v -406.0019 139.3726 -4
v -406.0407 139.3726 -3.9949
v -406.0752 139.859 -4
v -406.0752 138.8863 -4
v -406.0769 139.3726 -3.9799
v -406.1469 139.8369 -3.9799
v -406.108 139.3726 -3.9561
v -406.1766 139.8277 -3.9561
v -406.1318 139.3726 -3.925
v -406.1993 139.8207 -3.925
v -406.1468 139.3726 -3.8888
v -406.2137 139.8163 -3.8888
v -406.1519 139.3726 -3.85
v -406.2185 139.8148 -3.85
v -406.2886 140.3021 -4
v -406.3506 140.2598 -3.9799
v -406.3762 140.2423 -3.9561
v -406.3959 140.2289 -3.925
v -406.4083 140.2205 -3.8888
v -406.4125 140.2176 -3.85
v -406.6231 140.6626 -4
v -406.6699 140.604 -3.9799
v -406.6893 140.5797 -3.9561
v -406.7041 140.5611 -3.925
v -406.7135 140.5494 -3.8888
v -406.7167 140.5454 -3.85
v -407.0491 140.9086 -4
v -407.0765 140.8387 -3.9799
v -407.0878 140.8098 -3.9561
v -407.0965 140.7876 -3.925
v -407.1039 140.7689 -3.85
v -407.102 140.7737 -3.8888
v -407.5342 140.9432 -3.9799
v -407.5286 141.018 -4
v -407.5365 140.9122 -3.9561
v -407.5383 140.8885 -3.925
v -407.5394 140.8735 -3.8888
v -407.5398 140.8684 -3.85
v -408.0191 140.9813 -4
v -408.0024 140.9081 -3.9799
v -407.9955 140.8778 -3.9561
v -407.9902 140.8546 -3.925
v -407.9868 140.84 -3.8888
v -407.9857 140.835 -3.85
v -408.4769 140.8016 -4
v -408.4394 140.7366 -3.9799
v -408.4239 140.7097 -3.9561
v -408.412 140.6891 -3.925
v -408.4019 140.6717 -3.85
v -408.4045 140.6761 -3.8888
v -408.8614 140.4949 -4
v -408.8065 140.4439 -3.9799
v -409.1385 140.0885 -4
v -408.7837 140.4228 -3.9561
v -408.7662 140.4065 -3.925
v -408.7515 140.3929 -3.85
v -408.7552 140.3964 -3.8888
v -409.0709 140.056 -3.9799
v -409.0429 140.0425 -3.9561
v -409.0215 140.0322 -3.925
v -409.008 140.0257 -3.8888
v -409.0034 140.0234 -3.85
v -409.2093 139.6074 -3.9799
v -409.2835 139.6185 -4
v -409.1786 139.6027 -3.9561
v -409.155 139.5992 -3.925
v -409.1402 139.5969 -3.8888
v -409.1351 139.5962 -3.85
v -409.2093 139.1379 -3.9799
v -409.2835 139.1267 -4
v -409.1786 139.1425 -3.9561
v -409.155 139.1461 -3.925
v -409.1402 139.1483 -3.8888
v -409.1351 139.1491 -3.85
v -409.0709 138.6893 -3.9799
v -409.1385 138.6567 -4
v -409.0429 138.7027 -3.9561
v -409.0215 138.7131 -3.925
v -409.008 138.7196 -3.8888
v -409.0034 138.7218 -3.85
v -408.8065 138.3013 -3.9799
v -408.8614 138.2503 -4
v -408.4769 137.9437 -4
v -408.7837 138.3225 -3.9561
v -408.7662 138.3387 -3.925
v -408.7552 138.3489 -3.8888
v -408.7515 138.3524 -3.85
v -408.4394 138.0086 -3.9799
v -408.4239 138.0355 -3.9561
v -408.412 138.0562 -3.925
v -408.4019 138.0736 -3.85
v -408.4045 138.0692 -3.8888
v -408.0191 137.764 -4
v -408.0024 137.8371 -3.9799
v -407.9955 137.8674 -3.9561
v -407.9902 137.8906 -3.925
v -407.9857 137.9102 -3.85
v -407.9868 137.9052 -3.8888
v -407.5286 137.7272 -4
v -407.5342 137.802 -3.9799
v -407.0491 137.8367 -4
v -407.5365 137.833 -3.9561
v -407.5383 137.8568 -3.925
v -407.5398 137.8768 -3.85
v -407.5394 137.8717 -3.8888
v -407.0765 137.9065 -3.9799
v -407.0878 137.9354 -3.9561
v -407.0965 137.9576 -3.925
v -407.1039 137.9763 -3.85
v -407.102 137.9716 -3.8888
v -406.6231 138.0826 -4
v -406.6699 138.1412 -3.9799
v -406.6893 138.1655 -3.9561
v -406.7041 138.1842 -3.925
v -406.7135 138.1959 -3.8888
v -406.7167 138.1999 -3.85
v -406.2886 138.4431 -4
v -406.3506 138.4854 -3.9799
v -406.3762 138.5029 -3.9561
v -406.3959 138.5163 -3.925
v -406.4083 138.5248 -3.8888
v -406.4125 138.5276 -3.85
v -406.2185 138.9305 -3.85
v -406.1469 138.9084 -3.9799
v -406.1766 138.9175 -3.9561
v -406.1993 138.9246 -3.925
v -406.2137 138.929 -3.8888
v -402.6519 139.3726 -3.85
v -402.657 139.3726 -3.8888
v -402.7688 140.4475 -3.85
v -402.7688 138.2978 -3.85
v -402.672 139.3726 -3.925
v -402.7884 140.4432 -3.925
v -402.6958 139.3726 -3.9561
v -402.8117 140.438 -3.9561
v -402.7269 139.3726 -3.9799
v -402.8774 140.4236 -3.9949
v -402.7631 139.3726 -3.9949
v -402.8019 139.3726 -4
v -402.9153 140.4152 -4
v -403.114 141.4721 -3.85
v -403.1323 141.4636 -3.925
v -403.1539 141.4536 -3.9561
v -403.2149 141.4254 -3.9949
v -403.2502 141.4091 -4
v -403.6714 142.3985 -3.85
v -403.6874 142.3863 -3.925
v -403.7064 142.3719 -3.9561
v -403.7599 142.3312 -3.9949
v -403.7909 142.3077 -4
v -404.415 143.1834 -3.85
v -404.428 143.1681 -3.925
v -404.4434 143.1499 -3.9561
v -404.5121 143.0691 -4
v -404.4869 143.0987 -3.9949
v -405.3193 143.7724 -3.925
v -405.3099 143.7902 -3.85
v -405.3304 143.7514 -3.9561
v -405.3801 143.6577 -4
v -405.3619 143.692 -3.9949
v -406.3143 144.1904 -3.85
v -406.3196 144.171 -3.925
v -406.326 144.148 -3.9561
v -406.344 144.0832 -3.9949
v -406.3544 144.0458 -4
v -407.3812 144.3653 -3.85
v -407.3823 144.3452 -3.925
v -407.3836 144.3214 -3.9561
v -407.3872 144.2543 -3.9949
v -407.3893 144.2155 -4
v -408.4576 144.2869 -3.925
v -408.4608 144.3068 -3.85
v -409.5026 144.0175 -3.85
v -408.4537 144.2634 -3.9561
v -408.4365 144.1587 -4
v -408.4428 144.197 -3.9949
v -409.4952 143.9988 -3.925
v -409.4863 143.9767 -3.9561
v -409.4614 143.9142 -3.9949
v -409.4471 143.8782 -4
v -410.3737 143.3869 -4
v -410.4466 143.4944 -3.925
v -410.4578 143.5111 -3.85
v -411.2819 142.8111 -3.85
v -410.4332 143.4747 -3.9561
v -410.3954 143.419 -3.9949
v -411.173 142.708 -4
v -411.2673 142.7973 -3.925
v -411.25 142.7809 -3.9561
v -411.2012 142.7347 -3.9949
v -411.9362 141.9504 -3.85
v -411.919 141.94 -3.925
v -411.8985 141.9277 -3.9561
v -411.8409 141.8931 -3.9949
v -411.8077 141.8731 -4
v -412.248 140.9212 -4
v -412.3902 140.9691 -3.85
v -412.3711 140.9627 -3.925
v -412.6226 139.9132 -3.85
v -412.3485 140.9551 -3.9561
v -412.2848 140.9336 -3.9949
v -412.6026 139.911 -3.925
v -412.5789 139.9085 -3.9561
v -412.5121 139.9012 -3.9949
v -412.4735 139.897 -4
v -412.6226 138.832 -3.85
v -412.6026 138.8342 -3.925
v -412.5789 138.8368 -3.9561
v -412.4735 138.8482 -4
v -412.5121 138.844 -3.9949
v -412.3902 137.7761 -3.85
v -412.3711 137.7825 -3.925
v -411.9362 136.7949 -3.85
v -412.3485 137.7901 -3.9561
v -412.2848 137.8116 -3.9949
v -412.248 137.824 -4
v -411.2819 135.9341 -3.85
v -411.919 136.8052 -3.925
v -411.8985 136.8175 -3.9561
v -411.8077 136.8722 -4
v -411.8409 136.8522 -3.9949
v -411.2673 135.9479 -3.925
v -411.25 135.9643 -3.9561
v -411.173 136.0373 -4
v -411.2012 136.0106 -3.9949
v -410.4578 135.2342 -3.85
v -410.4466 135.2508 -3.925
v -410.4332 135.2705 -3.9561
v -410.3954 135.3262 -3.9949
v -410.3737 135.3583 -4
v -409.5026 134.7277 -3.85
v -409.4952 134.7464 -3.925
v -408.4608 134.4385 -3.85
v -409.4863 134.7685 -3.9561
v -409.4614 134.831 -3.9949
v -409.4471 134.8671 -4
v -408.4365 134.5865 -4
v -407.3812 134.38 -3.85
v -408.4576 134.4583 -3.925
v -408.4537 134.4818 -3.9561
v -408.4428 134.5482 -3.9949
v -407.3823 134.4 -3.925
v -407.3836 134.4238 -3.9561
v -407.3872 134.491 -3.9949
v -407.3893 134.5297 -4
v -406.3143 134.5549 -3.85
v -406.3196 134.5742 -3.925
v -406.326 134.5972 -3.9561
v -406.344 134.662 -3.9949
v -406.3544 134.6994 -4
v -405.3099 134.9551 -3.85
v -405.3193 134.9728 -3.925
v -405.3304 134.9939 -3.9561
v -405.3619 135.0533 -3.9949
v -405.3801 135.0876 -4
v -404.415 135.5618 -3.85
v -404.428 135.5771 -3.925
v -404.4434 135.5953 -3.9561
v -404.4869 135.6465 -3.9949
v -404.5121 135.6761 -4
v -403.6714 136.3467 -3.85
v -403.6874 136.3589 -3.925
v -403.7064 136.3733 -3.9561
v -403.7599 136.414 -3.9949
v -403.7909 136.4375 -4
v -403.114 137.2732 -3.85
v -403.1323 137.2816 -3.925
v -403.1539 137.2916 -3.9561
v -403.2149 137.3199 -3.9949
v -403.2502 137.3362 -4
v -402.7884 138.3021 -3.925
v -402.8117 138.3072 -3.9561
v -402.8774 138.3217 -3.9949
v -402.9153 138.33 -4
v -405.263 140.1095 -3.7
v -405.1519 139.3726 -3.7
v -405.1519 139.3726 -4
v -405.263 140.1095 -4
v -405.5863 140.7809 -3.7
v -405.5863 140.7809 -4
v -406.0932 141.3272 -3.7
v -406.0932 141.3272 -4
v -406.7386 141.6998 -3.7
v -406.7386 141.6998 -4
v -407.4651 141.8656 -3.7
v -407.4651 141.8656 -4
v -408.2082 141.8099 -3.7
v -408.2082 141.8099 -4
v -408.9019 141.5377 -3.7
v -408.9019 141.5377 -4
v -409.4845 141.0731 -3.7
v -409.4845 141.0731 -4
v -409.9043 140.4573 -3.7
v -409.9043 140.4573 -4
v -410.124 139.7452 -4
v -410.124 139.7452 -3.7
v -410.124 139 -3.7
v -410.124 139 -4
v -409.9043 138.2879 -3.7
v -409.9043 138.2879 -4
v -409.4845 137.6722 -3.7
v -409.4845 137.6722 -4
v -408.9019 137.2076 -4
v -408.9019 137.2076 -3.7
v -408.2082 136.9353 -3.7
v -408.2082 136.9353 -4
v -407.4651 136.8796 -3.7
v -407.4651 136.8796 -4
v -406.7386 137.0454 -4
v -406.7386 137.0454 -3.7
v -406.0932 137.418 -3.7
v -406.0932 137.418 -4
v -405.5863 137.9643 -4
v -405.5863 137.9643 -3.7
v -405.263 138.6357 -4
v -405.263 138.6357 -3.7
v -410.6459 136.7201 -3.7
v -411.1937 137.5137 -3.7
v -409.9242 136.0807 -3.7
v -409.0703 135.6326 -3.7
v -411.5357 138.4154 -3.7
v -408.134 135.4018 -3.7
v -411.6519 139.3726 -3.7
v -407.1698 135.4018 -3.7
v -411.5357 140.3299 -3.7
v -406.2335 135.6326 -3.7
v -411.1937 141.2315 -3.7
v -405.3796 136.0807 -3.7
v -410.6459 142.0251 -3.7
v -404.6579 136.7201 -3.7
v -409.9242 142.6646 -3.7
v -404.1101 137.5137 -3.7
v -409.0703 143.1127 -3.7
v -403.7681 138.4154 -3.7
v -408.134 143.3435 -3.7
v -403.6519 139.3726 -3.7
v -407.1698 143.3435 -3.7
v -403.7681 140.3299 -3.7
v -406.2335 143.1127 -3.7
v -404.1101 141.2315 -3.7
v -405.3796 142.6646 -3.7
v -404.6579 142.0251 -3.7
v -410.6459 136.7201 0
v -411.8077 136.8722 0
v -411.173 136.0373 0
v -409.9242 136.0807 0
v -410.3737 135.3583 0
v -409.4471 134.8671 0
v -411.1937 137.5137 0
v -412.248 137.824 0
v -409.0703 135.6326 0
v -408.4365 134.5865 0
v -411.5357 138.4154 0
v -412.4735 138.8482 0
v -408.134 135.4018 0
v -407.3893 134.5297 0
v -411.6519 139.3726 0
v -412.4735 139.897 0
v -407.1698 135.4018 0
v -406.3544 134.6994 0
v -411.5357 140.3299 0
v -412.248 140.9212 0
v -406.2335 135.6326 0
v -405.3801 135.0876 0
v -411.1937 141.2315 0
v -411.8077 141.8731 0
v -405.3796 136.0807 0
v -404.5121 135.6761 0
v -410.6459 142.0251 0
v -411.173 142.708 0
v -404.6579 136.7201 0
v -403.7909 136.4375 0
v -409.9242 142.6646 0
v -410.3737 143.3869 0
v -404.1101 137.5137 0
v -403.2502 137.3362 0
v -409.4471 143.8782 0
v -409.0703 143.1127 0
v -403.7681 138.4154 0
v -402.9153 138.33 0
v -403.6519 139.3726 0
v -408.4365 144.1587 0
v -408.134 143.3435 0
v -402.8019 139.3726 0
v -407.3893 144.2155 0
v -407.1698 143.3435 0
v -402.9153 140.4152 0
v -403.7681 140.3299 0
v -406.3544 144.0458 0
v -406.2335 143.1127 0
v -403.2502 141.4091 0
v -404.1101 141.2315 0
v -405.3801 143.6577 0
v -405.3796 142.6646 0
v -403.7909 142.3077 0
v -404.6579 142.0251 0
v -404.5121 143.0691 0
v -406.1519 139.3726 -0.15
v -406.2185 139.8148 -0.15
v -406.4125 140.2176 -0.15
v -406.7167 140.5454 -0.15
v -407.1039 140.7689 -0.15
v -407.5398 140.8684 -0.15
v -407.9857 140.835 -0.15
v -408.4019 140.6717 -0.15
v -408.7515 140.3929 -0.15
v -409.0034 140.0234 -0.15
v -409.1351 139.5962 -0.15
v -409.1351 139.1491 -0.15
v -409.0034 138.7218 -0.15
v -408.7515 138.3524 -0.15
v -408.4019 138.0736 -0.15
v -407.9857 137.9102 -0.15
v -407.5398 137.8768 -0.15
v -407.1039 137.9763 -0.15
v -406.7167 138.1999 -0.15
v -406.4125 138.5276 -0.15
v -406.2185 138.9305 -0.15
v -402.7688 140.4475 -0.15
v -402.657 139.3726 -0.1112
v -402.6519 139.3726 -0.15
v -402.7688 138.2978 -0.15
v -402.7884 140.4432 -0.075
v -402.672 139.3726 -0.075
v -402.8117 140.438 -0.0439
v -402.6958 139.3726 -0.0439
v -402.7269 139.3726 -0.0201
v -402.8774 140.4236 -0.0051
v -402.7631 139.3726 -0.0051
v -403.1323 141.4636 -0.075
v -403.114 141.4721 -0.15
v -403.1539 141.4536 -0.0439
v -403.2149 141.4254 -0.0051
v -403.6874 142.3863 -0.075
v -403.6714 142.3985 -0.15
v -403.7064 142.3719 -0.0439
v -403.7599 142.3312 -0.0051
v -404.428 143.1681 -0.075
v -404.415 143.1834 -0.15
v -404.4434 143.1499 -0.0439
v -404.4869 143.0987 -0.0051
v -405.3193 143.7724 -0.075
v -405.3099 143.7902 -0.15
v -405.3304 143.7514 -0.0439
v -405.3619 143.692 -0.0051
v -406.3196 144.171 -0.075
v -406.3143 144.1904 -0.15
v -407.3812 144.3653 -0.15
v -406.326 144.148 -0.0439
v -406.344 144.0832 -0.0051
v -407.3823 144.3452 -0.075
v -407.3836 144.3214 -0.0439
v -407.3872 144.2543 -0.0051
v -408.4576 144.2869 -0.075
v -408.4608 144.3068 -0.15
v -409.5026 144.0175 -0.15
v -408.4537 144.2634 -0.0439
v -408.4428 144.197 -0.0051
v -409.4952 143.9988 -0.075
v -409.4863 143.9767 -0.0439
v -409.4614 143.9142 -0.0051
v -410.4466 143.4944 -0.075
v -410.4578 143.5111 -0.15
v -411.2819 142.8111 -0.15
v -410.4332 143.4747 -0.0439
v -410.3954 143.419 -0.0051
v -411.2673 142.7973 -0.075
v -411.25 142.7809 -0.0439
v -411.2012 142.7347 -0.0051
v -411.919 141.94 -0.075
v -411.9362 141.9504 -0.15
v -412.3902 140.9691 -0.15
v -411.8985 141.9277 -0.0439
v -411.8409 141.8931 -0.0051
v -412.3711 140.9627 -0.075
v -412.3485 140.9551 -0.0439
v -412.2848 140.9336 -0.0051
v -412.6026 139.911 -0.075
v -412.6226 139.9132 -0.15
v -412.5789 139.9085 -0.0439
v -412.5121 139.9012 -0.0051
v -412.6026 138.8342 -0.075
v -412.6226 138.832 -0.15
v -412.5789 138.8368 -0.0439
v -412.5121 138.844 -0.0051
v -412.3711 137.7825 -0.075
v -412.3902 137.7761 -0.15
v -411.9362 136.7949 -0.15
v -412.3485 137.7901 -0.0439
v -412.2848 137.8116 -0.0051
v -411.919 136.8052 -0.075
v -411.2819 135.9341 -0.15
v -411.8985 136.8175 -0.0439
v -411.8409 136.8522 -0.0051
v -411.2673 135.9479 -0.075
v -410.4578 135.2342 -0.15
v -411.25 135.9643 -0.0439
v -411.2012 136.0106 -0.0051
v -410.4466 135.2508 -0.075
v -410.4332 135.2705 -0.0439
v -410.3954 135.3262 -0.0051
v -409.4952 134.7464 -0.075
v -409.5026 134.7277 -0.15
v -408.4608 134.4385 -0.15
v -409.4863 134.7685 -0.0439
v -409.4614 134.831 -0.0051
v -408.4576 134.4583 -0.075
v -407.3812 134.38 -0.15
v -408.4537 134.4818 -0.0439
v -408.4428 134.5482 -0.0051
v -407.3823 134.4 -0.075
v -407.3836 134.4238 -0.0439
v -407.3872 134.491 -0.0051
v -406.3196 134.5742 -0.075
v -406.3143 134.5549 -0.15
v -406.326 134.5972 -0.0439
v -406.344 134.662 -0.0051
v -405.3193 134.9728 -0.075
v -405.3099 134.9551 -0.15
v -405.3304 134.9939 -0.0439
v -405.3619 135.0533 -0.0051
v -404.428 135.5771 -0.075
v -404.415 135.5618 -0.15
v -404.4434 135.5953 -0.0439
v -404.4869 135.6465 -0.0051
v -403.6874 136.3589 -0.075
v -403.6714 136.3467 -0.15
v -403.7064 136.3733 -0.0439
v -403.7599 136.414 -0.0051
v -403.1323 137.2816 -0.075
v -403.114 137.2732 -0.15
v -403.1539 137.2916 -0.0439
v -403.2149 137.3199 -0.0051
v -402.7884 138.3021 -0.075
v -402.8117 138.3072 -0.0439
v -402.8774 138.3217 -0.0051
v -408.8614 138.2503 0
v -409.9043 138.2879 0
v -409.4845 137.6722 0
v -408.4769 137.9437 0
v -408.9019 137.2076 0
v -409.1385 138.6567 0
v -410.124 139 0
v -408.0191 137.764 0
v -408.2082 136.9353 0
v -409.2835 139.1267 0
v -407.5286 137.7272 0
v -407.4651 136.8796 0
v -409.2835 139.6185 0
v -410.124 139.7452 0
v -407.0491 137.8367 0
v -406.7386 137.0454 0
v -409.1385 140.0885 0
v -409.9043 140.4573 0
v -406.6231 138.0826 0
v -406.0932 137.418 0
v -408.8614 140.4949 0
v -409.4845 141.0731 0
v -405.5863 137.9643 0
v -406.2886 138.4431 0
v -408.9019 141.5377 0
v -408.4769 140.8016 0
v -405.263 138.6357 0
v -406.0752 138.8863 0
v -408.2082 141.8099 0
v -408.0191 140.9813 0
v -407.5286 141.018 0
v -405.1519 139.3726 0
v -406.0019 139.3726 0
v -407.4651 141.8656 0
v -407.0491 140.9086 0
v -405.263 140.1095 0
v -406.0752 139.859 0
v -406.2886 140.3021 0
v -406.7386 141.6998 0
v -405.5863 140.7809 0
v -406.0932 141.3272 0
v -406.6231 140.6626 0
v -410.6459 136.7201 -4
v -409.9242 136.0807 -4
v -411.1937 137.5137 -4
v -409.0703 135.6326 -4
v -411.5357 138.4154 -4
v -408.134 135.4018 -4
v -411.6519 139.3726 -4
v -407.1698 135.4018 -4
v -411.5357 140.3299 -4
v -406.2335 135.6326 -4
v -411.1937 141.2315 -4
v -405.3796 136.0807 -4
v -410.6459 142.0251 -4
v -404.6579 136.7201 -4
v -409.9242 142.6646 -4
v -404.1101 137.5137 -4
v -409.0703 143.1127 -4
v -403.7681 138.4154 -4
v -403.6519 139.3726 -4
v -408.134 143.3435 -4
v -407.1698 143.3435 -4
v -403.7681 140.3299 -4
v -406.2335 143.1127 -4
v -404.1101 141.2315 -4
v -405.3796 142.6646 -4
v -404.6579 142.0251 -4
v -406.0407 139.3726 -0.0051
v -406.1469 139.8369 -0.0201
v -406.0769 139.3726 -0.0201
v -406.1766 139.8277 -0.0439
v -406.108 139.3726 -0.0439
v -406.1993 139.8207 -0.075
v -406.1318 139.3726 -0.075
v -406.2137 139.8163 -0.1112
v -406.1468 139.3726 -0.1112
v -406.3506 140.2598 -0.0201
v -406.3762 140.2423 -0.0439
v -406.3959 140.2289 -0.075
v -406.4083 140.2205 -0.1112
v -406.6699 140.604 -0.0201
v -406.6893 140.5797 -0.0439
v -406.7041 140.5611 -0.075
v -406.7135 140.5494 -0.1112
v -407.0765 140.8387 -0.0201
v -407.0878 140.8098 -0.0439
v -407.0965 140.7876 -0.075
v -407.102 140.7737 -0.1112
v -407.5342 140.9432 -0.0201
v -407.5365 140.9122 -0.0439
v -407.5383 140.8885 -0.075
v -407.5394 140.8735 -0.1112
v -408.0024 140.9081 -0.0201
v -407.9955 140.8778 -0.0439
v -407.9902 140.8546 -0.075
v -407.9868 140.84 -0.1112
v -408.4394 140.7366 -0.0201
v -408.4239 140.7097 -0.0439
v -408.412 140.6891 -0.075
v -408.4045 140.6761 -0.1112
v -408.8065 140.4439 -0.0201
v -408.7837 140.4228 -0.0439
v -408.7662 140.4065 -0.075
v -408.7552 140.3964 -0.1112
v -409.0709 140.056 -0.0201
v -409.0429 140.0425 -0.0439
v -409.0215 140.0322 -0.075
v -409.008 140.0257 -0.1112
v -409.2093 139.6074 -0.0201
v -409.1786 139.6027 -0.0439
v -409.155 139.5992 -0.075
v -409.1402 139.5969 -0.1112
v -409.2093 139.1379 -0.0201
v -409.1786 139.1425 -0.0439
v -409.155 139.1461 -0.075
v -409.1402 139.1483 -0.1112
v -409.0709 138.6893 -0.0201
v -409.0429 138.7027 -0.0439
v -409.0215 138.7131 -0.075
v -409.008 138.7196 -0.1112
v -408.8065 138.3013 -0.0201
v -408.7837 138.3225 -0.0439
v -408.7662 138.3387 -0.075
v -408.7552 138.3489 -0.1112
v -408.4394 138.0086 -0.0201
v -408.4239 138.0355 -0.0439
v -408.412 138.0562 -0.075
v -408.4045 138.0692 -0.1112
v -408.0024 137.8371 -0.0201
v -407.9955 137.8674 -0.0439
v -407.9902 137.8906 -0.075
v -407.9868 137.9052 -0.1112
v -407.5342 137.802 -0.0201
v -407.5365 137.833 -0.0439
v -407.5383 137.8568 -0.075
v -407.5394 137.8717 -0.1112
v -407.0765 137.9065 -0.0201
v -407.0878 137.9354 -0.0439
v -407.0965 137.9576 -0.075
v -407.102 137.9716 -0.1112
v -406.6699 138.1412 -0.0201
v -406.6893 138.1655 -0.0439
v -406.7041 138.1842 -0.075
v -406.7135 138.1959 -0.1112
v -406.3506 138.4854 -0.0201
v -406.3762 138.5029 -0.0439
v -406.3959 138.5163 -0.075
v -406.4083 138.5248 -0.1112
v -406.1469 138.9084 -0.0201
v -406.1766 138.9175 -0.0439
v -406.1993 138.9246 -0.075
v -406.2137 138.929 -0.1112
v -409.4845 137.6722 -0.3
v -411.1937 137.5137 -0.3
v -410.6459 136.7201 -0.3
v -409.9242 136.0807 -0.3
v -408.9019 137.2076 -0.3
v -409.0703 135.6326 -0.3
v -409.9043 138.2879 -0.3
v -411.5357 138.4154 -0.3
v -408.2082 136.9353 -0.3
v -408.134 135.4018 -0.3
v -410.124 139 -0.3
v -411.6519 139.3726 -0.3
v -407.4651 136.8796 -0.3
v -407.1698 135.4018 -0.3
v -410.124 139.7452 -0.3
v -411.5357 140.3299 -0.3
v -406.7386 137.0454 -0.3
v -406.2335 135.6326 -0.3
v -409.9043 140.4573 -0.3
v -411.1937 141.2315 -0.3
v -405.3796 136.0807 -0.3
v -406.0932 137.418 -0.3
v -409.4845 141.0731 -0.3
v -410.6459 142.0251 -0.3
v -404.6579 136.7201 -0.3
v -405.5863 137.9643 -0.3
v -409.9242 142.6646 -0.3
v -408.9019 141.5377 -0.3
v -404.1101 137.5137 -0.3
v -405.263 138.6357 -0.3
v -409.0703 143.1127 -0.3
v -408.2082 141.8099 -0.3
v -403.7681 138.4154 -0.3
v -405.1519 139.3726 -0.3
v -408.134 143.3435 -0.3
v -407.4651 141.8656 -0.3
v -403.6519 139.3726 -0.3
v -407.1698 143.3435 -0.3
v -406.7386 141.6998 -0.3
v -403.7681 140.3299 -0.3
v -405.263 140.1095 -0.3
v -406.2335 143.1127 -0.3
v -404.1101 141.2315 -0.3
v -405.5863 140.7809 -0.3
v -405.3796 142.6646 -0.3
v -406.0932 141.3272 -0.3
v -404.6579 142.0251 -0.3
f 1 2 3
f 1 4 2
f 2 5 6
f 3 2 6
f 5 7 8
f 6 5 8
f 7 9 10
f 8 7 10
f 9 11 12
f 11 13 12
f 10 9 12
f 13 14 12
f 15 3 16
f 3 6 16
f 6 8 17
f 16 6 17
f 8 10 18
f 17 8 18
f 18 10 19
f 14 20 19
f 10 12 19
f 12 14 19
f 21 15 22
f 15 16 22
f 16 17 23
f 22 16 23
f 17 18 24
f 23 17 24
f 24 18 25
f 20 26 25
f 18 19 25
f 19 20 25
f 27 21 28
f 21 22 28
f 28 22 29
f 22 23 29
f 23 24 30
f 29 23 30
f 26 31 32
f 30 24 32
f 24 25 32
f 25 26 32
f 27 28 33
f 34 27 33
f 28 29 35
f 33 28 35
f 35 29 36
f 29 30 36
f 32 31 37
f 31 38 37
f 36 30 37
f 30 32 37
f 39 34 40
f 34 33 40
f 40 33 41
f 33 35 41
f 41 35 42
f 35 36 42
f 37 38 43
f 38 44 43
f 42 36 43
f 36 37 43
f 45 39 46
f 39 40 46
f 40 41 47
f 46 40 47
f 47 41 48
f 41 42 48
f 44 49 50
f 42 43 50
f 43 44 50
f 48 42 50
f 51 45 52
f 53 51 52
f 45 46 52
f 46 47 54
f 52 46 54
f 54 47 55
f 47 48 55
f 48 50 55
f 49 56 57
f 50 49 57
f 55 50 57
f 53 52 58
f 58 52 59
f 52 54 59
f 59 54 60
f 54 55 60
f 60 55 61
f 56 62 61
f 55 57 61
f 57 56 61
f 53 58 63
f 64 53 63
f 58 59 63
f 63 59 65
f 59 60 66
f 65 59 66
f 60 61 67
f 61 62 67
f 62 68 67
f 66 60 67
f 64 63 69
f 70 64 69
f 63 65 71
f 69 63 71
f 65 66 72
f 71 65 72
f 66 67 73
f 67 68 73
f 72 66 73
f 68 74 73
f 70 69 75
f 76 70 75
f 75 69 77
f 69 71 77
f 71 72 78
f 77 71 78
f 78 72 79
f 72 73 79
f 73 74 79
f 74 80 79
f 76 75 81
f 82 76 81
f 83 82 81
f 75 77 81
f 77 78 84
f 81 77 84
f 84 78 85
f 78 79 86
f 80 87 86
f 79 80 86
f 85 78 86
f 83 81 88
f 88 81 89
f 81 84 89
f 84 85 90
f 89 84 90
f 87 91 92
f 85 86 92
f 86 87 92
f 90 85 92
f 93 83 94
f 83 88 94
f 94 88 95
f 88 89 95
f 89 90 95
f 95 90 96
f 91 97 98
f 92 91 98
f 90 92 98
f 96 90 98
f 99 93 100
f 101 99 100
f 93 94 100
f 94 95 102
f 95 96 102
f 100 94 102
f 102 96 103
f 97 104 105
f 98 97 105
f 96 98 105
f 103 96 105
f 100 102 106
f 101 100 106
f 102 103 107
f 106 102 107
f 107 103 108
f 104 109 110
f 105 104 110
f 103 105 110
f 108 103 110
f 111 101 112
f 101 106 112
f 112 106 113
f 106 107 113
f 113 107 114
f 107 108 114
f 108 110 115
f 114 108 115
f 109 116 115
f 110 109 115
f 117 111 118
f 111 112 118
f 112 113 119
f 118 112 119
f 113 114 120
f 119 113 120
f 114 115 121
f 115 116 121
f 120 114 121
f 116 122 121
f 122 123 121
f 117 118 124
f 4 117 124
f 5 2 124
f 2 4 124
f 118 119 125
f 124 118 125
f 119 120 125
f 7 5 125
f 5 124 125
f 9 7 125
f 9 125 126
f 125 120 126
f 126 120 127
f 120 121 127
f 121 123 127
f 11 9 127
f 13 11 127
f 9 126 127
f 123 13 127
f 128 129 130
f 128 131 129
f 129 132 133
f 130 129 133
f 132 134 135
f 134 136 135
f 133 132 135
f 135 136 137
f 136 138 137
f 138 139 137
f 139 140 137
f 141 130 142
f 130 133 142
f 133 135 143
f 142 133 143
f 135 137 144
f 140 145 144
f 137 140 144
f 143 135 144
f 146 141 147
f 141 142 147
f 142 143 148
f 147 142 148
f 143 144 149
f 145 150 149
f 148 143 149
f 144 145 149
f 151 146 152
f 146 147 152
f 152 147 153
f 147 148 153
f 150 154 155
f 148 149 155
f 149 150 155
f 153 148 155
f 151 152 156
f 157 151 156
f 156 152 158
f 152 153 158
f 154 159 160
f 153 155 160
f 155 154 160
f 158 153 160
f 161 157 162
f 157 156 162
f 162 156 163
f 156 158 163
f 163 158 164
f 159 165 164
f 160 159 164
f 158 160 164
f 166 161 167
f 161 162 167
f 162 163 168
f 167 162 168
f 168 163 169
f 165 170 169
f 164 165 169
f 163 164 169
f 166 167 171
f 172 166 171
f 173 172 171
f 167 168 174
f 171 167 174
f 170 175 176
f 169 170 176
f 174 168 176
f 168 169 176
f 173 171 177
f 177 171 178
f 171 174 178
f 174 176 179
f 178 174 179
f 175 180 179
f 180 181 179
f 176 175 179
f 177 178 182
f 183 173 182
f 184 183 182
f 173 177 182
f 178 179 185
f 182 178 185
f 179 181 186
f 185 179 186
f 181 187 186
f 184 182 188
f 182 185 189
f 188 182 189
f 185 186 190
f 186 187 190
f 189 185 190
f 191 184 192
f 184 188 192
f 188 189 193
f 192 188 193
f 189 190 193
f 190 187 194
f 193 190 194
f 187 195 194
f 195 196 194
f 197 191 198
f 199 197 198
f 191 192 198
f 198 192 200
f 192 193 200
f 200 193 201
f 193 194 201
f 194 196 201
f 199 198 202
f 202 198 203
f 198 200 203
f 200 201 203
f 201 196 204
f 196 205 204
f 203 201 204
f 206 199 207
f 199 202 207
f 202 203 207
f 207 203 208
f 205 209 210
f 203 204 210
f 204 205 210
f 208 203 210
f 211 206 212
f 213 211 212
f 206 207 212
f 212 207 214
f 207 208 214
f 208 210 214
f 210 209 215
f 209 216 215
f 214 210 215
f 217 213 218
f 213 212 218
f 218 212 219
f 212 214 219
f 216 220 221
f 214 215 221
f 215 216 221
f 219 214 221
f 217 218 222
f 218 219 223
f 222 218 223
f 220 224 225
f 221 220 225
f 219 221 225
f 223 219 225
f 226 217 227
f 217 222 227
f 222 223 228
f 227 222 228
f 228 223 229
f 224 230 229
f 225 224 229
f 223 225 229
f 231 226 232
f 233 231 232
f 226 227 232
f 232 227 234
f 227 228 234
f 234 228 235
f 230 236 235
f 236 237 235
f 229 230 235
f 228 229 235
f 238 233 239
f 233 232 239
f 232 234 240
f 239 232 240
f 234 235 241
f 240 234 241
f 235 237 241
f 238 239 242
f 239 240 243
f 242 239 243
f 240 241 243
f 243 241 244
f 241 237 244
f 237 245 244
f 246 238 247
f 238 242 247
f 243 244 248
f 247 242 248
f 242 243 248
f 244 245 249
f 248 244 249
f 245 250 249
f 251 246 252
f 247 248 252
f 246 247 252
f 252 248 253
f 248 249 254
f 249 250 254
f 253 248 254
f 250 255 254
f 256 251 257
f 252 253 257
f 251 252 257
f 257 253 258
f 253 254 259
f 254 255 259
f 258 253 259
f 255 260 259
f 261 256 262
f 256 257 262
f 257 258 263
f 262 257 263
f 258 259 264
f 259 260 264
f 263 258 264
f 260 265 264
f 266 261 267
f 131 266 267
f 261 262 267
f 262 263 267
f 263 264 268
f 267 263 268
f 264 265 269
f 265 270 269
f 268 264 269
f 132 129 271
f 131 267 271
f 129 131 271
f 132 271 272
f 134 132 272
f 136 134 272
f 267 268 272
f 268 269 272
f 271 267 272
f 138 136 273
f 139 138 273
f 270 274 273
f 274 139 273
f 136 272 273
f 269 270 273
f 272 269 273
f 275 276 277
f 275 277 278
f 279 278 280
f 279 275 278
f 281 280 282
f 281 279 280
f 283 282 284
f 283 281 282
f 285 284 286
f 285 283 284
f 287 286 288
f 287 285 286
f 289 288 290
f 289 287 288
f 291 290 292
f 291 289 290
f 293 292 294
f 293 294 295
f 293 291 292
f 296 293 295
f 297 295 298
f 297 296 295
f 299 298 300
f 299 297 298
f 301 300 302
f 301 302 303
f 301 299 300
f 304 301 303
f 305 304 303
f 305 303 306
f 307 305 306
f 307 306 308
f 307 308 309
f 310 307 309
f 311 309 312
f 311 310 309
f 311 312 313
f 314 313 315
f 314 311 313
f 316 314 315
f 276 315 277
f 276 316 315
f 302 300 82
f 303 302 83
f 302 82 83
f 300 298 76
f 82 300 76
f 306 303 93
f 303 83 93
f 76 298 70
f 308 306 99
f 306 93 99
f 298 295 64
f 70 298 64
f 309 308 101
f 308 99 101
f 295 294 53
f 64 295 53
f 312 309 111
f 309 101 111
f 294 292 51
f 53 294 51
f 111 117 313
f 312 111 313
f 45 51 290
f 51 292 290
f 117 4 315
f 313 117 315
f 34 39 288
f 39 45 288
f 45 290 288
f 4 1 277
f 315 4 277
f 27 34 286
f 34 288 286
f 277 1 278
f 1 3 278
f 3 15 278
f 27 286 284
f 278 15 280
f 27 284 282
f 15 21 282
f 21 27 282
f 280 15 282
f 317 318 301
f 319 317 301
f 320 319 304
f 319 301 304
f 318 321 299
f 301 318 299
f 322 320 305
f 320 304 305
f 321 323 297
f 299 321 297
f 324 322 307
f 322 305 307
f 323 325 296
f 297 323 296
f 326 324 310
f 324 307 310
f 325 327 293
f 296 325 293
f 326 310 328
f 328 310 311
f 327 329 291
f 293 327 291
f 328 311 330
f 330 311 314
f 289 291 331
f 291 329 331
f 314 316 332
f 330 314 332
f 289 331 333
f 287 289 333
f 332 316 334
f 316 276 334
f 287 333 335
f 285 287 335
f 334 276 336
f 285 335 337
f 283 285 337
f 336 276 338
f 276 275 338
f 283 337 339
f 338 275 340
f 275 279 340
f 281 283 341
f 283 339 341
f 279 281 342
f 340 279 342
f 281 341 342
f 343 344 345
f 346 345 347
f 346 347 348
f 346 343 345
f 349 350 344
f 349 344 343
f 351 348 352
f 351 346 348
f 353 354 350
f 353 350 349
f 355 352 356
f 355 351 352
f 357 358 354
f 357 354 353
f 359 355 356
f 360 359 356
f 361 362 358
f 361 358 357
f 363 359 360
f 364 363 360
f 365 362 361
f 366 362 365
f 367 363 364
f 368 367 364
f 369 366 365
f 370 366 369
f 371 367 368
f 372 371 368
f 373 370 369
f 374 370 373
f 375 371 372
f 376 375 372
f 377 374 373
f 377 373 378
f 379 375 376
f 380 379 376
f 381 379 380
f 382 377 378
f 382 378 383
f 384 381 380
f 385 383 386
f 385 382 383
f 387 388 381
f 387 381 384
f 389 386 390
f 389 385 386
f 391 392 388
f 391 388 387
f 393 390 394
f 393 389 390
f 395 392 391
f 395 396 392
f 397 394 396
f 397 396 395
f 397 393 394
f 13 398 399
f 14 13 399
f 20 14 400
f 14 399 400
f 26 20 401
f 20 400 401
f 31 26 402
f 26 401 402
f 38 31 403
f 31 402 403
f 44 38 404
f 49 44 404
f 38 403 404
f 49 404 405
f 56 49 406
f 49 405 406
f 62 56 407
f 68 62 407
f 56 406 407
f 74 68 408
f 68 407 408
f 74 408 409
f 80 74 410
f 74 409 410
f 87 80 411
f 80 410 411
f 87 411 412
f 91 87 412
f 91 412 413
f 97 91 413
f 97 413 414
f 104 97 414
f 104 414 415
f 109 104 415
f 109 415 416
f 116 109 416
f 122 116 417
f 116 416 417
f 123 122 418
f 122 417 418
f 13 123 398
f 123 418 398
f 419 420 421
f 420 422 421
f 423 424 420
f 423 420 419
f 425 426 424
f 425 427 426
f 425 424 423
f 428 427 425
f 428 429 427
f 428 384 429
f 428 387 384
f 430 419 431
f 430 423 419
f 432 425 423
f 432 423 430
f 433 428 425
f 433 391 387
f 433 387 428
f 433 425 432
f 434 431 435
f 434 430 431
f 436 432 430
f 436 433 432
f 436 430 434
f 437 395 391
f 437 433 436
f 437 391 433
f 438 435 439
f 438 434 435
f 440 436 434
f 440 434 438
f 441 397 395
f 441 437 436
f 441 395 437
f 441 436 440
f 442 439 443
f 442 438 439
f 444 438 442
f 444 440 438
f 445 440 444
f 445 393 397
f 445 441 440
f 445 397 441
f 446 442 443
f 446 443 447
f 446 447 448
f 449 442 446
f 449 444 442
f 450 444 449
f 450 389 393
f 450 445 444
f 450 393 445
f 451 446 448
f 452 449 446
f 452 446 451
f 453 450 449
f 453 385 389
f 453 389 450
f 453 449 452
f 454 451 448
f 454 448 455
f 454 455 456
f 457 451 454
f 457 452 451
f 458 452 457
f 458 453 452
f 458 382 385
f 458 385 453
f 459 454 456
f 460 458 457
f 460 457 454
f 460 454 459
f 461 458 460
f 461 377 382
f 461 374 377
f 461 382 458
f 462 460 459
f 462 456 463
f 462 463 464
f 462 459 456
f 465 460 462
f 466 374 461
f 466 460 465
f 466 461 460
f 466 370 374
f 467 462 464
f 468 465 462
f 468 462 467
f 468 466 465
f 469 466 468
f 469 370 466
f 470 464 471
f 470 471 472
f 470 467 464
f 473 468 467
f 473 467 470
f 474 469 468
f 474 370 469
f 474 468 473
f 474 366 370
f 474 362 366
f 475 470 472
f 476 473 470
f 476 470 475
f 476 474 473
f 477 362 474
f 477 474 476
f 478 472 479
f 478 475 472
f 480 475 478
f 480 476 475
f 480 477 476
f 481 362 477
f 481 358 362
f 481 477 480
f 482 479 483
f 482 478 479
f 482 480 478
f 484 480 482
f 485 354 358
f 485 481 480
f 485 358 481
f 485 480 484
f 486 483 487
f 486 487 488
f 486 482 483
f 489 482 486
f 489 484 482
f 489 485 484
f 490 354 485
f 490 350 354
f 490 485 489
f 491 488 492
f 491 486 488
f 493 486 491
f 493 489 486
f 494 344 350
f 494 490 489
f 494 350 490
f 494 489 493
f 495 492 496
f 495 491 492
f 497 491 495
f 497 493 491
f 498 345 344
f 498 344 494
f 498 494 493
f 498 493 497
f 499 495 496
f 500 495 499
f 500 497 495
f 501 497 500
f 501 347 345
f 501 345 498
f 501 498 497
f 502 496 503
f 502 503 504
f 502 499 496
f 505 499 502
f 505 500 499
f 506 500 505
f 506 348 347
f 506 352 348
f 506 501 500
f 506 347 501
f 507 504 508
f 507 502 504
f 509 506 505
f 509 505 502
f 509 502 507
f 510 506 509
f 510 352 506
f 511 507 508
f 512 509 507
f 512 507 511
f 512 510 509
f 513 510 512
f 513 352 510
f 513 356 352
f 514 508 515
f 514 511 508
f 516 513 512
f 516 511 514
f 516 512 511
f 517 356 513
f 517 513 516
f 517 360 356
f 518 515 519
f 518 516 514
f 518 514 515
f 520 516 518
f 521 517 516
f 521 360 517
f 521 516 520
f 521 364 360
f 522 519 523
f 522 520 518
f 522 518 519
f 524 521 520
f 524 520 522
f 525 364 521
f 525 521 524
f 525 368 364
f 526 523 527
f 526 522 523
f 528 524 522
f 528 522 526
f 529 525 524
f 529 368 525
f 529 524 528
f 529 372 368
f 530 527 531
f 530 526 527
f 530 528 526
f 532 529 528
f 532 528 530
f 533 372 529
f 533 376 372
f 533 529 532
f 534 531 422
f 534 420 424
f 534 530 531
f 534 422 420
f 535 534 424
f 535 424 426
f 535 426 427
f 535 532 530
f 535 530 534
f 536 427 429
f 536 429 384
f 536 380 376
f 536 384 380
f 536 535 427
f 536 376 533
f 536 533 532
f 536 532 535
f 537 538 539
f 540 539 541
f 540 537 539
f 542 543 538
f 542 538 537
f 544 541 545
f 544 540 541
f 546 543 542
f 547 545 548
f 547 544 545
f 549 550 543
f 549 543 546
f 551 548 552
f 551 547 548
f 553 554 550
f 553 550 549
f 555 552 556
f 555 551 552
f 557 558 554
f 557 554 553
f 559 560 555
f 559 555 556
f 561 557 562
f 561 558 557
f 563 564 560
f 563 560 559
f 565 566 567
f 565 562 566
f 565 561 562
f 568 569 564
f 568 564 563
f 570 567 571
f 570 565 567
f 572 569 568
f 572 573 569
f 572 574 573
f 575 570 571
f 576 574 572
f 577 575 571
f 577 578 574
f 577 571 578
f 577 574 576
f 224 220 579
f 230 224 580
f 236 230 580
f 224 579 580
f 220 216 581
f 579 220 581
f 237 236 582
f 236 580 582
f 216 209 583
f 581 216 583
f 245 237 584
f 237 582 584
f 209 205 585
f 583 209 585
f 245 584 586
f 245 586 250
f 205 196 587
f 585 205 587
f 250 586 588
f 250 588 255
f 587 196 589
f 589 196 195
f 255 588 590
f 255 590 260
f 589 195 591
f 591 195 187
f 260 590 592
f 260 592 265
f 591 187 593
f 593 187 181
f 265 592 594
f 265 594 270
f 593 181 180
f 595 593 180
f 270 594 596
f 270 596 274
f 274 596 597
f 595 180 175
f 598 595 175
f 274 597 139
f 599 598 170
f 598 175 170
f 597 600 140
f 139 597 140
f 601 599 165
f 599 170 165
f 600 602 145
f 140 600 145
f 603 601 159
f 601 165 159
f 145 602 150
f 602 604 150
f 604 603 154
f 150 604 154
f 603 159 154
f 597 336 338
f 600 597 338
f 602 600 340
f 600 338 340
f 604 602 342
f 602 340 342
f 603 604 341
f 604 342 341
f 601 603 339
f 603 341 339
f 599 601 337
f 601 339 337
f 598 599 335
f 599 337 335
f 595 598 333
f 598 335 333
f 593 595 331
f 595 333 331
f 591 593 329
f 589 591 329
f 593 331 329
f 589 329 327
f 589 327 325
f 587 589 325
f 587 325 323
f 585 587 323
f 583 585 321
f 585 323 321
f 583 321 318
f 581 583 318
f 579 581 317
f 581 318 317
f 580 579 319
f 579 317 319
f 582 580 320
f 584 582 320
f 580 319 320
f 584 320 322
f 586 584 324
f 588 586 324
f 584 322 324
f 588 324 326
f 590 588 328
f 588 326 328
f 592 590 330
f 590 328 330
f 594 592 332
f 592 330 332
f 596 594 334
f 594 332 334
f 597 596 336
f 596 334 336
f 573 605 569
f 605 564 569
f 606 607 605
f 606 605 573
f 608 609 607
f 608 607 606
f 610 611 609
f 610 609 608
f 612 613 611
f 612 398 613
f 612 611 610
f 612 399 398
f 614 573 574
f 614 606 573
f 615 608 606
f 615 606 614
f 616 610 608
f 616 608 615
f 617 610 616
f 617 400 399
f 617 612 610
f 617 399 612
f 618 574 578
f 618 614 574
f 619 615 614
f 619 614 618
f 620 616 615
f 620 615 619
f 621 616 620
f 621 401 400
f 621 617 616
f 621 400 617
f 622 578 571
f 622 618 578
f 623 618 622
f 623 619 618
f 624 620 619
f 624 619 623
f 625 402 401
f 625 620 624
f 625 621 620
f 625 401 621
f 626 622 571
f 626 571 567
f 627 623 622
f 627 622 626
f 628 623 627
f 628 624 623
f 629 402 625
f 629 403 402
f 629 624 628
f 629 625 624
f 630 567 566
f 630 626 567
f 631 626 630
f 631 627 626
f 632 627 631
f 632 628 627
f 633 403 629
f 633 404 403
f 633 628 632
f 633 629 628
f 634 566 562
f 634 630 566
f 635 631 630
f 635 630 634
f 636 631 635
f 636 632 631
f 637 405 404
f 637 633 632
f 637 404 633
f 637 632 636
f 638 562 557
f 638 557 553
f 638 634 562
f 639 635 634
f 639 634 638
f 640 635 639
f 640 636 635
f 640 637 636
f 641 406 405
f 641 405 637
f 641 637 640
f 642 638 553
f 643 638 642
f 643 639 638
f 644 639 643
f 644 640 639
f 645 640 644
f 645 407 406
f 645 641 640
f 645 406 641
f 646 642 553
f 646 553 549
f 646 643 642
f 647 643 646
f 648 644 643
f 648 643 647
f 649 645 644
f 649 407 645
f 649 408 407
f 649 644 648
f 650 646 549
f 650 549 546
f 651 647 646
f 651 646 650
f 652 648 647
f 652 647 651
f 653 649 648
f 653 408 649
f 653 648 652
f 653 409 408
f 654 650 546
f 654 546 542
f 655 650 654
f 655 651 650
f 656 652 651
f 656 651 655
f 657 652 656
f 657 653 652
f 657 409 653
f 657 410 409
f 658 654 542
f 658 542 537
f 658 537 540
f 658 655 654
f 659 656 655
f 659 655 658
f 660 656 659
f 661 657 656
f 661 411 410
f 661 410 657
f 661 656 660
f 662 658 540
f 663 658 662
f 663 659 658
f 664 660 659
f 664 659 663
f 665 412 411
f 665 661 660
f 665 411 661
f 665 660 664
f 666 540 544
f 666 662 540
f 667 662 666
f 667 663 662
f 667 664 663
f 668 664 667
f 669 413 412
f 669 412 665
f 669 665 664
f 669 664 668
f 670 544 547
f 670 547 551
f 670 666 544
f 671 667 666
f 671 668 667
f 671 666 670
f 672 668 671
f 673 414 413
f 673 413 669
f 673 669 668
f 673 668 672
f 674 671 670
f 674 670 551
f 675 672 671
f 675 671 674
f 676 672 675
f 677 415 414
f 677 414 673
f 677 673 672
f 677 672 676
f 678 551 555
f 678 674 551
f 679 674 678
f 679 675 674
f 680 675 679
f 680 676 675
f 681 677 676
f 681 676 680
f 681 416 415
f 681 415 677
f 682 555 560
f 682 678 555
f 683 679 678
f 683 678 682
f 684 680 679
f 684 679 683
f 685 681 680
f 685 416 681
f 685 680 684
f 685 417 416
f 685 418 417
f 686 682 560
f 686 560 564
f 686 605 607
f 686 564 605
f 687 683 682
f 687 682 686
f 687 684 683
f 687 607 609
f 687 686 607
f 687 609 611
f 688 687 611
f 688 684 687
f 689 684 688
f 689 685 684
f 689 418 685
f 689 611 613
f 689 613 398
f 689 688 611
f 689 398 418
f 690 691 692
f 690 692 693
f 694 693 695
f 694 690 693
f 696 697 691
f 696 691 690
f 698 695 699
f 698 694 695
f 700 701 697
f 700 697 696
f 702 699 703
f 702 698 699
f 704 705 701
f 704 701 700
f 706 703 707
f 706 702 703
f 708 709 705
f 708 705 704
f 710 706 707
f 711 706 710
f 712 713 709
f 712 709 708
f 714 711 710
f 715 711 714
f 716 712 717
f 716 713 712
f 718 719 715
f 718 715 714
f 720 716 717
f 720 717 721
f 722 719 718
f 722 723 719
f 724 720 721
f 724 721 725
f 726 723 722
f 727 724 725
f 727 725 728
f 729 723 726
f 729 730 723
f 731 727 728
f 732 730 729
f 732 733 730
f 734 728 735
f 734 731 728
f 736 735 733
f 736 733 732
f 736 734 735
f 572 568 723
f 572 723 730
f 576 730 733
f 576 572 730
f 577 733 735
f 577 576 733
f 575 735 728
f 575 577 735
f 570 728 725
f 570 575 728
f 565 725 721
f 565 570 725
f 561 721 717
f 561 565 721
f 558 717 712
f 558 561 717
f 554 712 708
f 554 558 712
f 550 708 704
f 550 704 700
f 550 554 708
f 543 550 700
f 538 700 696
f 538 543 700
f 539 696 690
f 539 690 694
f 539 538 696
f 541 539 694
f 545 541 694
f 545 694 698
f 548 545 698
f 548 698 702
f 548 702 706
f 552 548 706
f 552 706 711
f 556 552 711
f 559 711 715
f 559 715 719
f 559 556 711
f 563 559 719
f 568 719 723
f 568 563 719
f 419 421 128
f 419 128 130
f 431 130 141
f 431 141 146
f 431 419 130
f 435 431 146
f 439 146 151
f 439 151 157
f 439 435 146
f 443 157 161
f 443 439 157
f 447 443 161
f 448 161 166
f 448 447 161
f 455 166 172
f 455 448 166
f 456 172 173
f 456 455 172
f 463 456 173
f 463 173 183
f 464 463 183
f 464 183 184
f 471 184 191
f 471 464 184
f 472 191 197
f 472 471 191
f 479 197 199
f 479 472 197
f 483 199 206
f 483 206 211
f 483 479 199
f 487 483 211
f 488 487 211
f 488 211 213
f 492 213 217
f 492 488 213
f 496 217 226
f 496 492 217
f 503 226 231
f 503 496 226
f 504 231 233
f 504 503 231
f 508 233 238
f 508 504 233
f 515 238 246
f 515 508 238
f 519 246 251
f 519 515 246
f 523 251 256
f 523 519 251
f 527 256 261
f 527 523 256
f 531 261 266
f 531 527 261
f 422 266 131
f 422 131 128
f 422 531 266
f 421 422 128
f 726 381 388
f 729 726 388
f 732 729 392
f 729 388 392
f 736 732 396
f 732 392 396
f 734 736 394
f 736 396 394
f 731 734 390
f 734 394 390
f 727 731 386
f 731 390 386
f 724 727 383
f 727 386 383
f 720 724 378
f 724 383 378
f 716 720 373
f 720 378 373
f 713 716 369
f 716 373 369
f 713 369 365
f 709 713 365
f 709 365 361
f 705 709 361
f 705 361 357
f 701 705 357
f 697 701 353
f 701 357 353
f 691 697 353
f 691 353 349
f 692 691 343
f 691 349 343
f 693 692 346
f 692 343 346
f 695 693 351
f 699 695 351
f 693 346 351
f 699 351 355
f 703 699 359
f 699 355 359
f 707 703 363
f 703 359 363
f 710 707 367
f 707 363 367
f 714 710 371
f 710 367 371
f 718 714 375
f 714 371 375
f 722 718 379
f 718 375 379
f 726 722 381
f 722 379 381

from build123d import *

# Parameters (mm, degrees)
SKETCH_1_R          = 5
SKETCH_1_R_2        = 1.5
EXTRUDE_1_DEPTH     = 4
SKETCH_2_R          = 4
SKETCH_2_R_2        = 2.5
CUT_EXTRUDE_1_DEPTH = 0.3
CUT_EXTRUDE_START   = -3.7
SKETCH_2_2_R        = 4
SKETCH_2_2_R_2      = 2.5
CUT_EXTRUDE_3_DEPTH = 0.3
FILLET_1_R          = 0.15


with BuildPart() as part:
    # Эскиз1 → Бобышка-Вытянуть1 (new body)
    with BuildSketch(Plane.XY):
        with Locations((-407.651902974, 139.372619686)):
            Circle(SKETCH_1_R)
        with Locations((-407.651902974, 139.372619686)):
            Circle(SKETCH_1_R_2, mode=Mode.SUBTRACT)
    extrude(amount=-EXTRUDE_1_DEPTH)

    # Эскиз2 → Вырез-Вытянуть1 (cut)
    with BuildSketch(Plane.XY):
        with Locations((-407.651902974, 139.372619686)):
            Circle(SKETCH_2_R)
        with Locations((-407.651902974, 139.372619686)):
            Circle(SKETCH_2_R_2, mode=Mode.SUBTRACT)
    extrude(amount=-CUT_EXTRUDE_1_DEPTH, mode=Mode.SUBTRACT)

    # Эскиз2<2> → Вырез-Вытянуть3 (cut)
    with BuildSketch(Plane.XY.offset(CUT_EXTRUDE_START)):
        with Locations((-407.651902974, 139.372619686)):
            Circle(SKETCH_2_2_R)
        with Locations((-407.651902974, 139.372619686)):
            Circle(SKETCH_2_2_R_2, mode=Mode.SUBTRACT)
    extrude(amount=-CUT_EXTRUDE_3_DEPTH, mode=Mode.SUBTRACT)

    # Скругление1
    fillet_1_edges = [part.edges().sort_by_distance(p)[0] for p in [
        (-412.651902974, 139.372619686, 0),
        (-412.651902974, 139.372619686, -4),
        (-409.151902974, 139.372619686, -4),
        (-409.151902974, 139.372619686, 0),
    ]]
    fillet(fillet_1_edges, radius=FILLET_1_R)


solid = part.part
